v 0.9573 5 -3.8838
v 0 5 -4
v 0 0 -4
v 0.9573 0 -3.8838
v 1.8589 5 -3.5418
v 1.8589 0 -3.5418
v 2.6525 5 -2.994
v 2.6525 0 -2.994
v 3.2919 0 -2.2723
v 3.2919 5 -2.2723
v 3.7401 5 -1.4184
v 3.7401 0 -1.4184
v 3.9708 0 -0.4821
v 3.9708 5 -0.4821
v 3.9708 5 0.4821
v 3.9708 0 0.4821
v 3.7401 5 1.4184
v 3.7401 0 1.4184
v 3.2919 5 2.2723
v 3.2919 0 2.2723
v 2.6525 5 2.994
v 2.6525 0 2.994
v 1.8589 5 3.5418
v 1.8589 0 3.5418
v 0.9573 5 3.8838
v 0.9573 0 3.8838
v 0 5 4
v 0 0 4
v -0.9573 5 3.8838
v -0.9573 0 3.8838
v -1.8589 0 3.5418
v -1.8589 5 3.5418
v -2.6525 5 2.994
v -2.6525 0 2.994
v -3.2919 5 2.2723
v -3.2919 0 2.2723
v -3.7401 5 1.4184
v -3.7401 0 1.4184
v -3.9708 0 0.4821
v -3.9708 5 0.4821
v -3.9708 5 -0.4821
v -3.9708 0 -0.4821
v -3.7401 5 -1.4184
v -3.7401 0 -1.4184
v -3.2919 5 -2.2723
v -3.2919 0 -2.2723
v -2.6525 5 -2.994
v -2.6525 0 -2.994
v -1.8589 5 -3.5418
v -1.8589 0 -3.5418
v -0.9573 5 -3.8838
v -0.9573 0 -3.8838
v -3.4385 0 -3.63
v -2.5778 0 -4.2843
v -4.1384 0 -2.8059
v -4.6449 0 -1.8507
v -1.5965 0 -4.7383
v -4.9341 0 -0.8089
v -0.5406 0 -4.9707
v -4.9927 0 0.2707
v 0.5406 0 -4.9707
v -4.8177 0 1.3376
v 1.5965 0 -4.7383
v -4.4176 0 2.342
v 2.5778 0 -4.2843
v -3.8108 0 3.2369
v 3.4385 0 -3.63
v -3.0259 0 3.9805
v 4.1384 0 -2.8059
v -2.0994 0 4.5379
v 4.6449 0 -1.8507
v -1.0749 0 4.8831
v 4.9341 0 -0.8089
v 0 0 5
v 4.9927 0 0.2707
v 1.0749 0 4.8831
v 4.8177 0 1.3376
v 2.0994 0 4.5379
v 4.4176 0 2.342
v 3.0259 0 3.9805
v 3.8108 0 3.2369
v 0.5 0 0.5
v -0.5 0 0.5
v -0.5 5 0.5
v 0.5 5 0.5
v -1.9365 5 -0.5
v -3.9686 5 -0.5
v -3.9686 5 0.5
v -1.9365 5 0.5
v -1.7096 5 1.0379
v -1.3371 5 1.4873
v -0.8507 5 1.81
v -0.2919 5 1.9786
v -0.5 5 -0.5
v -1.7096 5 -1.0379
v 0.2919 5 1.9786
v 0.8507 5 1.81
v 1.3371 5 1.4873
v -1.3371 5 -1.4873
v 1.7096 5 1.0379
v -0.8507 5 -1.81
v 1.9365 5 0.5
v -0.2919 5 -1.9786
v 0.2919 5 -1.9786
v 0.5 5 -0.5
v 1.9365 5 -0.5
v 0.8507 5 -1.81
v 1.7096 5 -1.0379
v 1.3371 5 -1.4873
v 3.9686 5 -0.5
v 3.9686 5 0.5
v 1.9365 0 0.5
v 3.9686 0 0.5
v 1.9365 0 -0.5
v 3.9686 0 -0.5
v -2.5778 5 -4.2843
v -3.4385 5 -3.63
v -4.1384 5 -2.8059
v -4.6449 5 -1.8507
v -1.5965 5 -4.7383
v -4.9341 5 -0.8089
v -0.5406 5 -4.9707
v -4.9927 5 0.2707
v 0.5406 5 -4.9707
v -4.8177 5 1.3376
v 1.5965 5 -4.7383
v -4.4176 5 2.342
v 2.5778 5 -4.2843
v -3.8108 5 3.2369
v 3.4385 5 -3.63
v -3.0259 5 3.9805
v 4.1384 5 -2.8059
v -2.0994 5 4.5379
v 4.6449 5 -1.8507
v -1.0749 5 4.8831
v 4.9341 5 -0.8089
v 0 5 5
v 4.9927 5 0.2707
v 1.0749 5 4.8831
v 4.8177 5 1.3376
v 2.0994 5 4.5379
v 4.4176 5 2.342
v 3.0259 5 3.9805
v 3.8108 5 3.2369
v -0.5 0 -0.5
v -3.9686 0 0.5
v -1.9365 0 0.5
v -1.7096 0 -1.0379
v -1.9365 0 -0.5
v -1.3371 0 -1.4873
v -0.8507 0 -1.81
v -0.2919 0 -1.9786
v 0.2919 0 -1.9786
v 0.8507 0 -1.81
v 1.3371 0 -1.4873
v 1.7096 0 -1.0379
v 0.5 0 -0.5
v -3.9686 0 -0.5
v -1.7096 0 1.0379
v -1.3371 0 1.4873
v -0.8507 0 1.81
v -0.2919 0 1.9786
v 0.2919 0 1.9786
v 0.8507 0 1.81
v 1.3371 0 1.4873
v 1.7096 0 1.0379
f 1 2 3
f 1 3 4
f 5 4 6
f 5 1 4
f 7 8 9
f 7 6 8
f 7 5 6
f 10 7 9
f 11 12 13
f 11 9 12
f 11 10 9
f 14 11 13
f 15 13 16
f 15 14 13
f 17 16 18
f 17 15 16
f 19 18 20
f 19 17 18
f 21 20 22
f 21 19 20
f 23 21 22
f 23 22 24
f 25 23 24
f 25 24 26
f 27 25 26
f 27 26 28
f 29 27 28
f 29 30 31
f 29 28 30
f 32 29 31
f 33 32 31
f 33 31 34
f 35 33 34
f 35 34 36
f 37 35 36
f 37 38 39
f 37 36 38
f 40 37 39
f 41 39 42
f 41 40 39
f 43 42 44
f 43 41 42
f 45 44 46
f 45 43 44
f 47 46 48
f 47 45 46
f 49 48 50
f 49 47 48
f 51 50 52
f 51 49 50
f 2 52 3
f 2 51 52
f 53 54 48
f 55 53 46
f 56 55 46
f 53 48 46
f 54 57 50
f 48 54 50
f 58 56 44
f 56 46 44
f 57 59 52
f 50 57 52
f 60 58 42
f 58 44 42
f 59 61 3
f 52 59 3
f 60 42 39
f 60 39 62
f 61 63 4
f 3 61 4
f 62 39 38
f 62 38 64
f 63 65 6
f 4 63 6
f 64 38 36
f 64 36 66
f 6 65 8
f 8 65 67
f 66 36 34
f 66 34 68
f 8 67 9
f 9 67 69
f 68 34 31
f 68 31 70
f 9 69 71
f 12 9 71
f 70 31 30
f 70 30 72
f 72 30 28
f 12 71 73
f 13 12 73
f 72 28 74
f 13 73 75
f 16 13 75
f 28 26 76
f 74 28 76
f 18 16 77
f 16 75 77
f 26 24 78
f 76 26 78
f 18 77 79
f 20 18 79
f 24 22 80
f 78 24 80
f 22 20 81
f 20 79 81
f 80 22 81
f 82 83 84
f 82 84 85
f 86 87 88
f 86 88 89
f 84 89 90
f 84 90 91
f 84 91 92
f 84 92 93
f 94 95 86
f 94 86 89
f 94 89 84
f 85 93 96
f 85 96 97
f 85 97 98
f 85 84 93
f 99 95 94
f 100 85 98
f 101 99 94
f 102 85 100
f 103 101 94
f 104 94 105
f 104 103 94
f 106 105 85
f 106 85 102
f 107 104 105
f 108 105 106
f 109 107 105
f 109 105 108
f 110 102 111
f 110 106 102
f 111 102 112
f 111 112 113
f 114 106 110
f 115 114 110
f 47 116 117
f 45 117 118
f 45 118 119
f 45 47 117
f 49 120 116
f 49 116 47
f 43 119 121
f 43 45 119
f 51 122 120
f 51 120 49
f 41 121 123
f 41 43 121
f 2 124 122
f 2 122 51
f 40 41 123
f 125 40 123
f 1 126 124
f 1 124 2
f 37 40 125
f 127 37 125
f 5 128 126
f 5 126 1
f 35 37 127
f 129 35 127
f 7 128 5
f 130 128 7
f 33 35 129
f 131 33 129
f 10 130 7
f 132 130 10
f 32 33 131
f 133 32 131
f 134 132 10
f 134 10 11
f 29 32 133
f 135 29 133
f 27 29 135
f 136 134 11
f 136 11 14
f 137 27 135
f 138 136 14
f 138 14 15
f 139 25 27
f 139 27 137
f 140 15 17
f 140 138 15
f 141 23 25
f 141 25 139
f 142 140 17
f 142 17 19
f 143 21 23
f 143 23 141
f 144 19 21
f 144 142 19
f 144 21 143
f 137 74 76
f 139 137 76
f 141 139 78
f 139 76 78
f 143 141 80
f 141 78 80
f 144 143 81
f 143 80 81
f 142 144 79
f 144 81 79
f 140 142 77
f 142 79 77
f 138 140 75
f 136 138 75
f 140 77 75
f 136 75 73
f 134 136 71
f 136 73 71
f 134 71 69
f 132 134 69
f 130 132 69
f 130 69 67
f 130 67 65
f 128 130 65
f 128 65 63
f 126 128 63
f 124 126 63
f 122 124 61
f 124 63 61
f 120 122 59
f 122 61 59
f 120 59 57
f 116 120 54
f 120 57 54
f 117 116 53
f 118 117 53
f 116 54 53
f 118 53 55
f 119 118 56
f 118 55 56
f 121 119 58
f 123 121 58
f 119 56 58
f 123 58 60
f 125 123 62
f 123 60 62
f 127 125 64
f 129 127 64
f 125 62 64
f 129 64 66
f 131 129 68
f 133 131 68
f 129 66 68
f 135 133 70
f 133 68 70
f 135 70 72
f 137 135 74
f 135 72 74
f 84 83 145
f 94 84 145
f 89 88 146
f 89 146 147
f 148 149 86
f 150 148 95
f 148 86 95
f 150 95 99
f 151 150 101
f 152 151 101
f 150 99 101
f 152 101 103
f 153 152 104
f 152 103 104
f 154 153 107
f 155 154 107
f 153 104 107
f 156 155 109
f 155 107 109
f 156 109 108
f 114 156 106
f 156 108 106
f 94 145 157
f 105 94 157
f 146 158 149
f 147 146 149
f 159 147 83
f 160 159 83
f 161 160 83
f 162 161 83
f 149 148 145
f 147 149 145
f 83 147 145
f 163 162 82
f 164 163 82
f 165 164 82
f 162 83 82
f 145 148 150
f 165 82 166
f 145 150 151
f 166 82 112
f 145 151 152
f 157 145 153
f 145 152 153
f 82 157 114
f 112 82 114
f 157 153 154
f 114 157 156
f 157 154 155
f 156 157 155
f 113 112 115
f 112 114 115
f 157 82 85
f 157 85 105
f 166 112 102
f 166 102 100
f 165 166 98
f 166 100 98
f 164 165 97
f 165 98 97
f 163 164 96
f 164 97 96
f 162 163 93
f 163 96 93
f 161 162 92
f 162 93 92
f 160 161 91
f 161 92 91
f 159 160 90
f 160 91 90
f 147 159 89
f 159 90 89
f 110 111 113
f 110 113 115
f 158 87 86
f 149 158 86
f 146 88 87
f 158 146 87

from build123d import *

# Parameters (mm, degrees)
SKETCH2_R               = 5
SKETCH2_W               = 1
SKETCH2_H               = 1
BOSS_EXTRUDE1_DEPTH     = 5
CUT_EXTRUDE1_DEPTH      = 9.660254038
CUT_EXTRUDE1_DEPTH_BACK = 9.660254038
SKETCH4_R               = 4
SKETCH4_R_2             = 2
SKETCH6_W               = 7.937253934
SKETCH6_H               = 1
BOSS_EXTRUDE2_DEPTH     = 5
CUT_EXTRUDE2_DEPTH      = 9.660254038
CUT_EXTRUDE2_DEPTH_BACK = 9.660254038
SKETCH7_W               = 1
SKETCH7_H               = 1


with BuildPart() as part:
    # Sketch2 → Boss-Extrude1 (new body)
    with BuildSketch(Plane(origin=(0, 0, 0), x_dir=(1, 0, 0), z_dir=(0, 1, 0))):
        with Locations(Location((0, 0, 0), (0, 0, 270))):
            Circle(SKETCH2_R)
        Rectangle(SKETCH2_W, SKETCH2_H, mode=Mode.SUBTRACT)
    extrude(amount=BOSS_EXTRUDE1_DEPTH)

    # Sketch4 → Cut-Extrude1 (cut, two sides: drawn at the far end of the back side and taken through both)
    with BuildSketch(Plane.XZ.offset(-CUT_EXTRUDE1_DEPTH_BACK)):
        with Locations(Location((0, 0, 0), (0, 0, 270))):
            Circle(SKETCH4_R)
        with Locations(Location((0, 0, 0), (0, 0, 270))):
            Circle(SKETCH4_R_2, mode=Mode.SUBTRACT)
    extrude(amount=CUT_EXTRUDE1_DEPTH + CUT_EXTRUDE1_DEPTH_BACK, mode=Mode.SUBTRACT)


with BuildPart() as cut_extrude1_piece_1:
    # of the separate pieces the step leaves, piece 1, a body of its own (cut_extrude1_pieces)
    add(part.part.solids().sort_by_distance((0, 0, 5))[0])


with BuildPart() as cut_extrude1_piece_2:
    # of the separate pieces the step leaves, piece 2, a body of its own (cut_extrude1_pieces)
    add(part.part.solids().sort_by_distance((0, 0, -2))[0])

    # Sketch6 → Boss-Extrude2 (add)
    with BuildSketch(Plane(origin=(0, 5, 0), x_dir=(1, 0, 0), z_dir=(0, 1, 0))):
        Rectangle(SKETCH6_W, SKETCH6_H)
    extrude(amount=-BOSS_EXTRUDE2_DEPTH)

    # Sketch7 → Cut-Extrude2 (cut, two sides: drawn at the far end of the back side and taken through both)
    with BuildSketch(Plane(origin=(0, 5, 0), x_dir=(1, 0, 0), z_dir=(0, 1, 0)).offset(-CUT_EXTRUDE2_DEPTH_BACK)):
        Rectangle(SKETCH7_W, SKETCH7_H)
    extrude(amount=CUT_EXTRUDE2_DEPTH + CUT_EXTRUDE2_DEPTH_BACK, mode=Mode.SUBTRACT)


solid = Compound([cut_extrude1_piece_1.part, cut_extrude1_piece_2.part])
